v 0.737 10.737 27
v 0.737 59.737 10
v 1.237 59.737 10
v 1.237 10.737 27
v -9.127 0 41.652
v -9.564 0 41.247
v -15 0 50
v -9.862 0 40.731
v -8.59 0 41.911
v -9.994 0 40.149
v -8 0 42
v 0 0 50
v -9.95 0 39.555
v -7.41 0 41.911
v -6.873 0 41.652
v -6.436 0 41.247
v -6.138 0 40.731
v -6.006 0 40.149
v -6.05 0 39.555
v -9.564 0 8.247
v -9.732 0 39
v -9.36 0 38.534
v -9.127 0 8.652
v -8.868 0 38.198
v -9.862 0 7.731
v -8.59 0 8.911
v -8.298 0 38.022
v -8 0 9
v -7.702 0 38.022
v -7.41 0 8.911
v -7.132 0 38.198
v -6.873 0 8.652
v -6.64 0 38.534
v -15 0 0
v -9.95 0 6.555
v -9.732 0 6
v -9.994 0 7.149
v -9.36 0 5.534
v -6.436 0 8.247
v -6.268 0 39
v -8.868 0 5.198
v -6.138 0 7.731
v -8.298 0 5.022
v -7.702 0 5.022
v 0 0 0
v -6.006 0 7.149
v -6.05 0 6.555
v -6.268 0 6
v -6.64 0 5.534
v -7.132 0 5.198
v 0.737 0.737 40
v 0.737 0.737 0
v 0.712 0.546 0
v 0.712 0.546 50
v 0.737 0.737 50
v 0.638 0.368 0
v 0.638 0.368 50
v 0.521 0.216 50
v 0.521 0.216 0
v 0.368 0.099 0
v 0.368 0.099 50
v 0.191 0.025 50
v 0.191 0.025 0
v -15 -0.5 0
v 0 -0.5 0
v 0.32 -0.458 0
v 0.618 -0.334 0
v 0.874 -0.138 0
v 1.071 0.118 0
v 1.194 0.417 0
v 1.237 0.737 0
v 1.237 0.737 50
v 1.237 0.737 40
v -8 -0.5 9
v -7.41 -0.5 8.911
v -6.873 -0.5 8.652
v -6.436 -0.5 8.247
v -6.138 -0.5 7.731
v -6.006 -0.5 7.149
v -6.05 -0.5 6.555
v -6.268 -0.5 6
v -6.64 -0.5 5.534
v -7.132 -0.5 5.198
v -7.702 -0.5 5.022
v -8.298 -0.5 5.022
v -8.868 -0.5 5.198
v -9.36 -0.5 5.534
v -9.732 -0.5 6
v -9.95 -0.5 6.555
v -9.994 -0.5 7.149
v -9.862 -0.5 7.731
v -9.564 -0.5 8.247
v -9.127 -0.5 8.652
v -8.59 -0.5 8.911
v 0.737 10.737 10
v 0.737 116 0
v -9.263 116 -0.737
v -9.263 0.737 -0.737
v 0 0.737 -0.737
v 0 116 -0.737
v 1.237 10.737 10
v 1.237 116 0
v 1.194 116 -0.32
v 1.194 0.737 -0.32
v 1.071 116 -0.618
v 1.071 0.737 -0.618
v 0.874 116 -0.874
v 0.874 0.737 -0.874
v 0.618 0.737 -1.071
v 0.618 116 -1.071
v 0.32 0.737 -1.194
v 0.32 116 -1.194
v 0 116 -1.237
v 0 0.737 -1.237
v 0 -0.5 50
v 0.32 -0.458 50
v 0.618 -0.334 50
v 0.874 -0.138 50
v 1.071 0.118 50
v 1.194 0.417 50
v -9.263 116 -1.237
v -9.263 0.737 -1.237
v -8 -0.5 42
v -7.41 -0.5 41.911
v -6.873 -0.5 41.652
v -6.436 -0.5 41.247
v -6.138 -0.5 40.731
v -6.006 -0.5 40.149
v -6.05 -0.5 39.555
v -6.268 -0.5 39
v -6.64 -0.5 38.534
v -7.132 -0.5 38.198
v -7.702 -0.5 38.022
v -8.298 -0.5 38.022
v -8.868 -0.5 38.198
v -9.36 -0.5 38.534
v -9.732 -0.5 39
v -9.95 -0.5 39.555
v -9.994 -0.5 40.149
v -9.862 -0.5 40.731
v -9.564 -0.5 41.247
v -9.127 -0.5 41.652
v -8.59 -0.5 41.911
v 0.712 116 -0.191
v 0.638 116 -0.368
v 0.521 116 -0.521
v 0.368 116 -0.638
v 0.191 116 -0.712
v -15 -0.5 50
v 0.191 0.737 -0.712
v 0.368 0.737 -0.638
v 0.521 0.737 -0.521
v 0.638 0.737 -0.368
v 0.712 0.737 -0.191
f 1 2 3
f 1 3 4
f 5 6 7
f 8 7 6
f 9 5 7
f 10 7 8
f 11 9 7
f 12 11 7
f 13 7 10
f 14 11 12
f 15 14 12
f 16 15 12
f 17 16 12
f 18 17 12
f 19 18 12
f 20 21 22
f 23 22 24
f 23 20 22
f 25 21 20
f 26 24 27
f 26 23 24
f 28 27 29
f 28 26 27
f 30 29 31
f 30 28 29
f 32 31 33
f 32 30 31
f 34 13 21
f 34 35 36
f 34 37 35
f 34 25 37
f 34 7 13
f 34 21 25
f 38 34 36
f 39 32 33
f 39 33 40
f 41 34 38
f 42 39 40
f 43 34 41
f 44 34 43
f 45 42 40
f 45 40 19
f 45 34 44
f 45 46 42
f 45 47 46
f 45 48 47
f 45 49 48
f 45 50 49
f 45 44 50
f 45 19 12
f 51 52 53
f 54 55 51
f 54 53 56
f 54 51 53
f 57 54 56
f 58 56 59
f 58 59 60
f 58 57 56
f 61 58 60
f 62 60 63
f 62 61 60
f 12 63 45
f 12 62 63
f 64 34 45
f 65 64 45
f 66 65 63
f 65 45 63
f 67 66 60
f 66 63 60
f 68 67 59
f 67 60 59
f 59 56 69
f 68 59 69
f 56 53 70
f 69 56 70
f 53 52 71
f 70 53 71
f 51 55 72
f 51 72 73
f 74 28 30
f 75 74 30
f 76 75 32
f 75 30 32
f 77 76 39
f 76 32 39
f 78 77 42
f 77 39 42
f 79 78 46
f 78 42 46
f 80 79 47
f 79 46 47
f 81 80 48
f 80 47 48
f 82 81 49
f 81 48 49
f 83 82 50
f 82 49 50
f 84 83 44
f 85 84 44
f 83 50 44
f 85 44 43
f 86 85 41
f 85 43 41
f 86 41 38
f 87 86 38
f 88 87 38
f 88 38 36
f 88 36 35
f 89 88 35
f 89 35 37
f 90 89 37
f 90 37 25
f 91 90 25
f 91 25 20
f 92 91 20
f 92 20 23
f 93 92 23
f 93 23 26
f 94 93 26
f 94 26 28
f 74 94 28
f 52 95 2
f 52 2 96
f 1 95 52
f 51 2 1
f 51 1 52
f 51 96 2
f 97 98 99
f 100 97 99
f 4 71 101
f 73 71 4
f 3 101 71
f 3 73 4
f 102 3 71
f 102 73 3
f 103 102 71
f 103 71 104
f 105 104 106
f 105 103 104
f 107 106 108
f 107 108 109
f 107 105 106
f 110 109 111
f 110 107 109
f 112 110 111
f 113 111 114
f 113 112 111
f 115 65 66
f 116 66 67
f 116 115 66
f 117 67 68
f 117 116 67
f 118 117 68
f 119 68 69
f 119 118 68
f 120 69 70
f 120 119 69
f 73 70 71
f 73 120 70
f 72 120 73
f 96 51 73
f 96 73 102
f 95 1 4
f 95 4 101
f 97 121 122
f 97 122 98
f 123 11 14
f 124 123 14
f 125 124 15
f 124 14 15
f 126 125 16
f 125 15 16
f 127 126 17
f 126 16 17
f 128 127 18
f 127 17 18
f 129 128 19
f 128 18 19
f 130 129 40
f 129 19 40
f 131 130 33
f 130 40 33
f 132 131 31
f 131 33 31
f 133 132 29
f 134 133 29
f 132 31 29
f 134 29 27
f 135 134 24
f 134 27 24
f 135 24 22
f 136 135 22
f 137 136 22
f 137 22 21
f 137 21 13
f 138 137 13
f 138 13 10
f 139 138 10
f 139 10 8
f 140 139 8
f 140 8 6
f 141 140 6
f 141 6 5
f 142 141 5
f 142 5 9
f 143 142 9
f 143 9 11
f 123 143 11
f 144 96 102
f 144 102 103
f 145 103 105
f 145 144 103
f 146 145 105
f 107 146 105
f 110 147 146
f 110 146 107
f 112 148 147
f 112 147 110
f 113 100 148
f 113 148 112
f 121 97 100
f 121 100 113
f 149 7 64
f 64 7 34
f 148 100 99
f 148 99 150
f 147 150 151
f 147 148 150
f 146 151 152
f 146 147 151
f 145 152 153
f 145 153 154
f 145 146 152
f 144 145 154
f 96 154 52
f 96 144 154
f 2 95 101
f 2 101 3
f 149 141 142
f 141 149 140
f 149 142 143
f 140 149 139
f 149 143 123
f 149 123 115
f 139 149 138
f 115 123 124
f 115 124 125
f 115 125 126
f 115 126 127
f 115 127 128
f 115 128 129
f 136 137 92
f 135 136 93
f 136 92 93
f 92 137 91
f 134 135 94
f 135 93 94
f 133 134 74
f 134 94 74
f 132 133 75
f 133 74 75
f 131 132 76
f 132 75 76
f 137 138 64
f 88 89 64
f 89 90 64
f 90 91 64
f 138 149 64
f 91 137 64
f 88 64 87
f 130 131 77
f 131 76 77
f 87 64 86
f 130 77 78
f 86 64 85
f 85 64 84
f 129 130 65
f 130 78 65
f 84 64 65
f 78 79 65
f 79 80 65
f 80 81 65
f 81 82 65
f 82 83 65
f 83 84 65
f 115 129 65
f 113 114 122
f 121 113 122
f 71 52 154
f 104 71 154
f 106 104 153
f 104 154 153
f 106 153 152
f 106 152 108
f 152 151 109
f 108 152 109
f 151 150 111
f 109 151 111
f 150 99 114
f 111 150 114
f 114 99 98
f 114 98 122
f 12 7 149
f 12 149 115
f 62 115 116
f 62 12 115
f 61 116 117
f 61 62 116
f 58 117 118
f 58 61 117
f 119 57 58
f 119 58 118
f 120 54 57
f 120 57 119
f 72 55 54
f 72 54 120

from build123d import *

# Parameters (mm, degrees)
SKETCH2_W          = 15
SKETCH2_H          = 50
BASE_FLANGE1_DEPTH = 0.5
EDGE_FLANGE1_DEPTH = 50
CUT_EXTRUDE1_DEPTH = 10
CUT_EXTRUDE2_DEPTH = 10
SKETCH22_R         = 2
CUT_EXTRUDE3_DEPTH = 10
EDGE_FLANGE2_DEPTH = 115.2634


# Sheet-metal steps are written as plain solids
with BuildPart() as part:
    # Sketch2 → Base-Flange1 (new body)
    with BuildSketch(Plane(origin=(0, 0, 0), x_dir=(1, 0, 0), z_dir=(0, 1, 0))):
        with Locations((-7.5, -25)):
            Rectangle(SKETCH2_W, SKETCH2_H)
    extrude(amount=-BASE_FLANGE1_DEPTH)

    # Edge-Flange1 section (across the edge) → Edge-Flange1 (add)
    with BuildSketch(Plane(origin=(0.7366, 0, 50), x_dir=(-1, 0, 0), z_dir=(0, 0, -1))):
        with BuildLine():
            Line((-0.5, 0.7366), (-0.5, 116))
            Line((-0.5, 116), (0, 116))
            Line((0, 116), (0, 0.7366))
            ThreePointArc((0, 0.7366), (0.215745145, 0.215745145), (0.7366, 0))
            Line((0.7366, 0), (0.7366, -0.5))
            ThreePointArc((0.7366, -0.5), (-0.137808246, -0.137808246), (-0.5, 0.7366))
        make_face()
    extrude(amount=EDGE_FLANGE1_DEPTH)

    # Sketch19 → Cut-Extrude1 (cut)
    with BuildSketch(Plane.ZY.offset(-0.7366)):
        Polygon((50, 0.7366), (40, 0.7366), (0, 116), (50, 116), align=None)
    extrude(amount=-CUT_EXTRUDE1_DEPTH, mode=Mode.SUBTRACT)

    # Sketch21 → Cut-Extrude2 (cut)
    with BuildSketch(Plane.ZY.offset(-0.7366)):
        Polygon((10, 10.7366), (10, 59.7366), (27, 10.7366), align=None)
    extrude(amount=-CUT_EXTRUDE2_DEPTH, mode=Mode.SUBTRACT)

    # Sketch22 → Cut-Extrude3 (cut)
    with BuildSketch(Plane(origin=(0, 0, 0), x_dir=(1, 0, 0), z_dir=(0, 1, 0))):
        with Locations(Location((-8, -40, 0), (0, 0, 270))):
            Circle(SKETCH22_R)
        with Locations(Location((-8, -7, 0), (0, 0, 270))):
            Circle(SKETCH22_R)
    extrude(amount=-CUT_EXTRUDE3_DEPTH, mode=Mode.SUBTRACT)

    # Edge-Flange2 section (across the edge) → Edge-Flange2 (add)
    with BuildSketch(Plane(origin=(0.7366, 116, -0.7366), x_dir=(0, 0, 1), z_dir=(0, -1, 0))):
        with BuildLine():
            Line((-0.5, 0.7366), (-0.5, 10))
            Line((-0.5, 10), (0, 10))
            Line((0, 10), (0, 0.7366))
            ThreePointArc((0, 0.7366), (0.215745145, 0.215745145), (0.7366, 0))
            Line((0.7366, 0), (0.7366, -0.5))
            ThreePointArc((0.7366, -0.5), (-0.137808246, -0.137808246), (-0.5, 0.7366))
        make_face()
    extrude(amount=EDGE_FLANGE2_DEPTH)


solid = part.part
